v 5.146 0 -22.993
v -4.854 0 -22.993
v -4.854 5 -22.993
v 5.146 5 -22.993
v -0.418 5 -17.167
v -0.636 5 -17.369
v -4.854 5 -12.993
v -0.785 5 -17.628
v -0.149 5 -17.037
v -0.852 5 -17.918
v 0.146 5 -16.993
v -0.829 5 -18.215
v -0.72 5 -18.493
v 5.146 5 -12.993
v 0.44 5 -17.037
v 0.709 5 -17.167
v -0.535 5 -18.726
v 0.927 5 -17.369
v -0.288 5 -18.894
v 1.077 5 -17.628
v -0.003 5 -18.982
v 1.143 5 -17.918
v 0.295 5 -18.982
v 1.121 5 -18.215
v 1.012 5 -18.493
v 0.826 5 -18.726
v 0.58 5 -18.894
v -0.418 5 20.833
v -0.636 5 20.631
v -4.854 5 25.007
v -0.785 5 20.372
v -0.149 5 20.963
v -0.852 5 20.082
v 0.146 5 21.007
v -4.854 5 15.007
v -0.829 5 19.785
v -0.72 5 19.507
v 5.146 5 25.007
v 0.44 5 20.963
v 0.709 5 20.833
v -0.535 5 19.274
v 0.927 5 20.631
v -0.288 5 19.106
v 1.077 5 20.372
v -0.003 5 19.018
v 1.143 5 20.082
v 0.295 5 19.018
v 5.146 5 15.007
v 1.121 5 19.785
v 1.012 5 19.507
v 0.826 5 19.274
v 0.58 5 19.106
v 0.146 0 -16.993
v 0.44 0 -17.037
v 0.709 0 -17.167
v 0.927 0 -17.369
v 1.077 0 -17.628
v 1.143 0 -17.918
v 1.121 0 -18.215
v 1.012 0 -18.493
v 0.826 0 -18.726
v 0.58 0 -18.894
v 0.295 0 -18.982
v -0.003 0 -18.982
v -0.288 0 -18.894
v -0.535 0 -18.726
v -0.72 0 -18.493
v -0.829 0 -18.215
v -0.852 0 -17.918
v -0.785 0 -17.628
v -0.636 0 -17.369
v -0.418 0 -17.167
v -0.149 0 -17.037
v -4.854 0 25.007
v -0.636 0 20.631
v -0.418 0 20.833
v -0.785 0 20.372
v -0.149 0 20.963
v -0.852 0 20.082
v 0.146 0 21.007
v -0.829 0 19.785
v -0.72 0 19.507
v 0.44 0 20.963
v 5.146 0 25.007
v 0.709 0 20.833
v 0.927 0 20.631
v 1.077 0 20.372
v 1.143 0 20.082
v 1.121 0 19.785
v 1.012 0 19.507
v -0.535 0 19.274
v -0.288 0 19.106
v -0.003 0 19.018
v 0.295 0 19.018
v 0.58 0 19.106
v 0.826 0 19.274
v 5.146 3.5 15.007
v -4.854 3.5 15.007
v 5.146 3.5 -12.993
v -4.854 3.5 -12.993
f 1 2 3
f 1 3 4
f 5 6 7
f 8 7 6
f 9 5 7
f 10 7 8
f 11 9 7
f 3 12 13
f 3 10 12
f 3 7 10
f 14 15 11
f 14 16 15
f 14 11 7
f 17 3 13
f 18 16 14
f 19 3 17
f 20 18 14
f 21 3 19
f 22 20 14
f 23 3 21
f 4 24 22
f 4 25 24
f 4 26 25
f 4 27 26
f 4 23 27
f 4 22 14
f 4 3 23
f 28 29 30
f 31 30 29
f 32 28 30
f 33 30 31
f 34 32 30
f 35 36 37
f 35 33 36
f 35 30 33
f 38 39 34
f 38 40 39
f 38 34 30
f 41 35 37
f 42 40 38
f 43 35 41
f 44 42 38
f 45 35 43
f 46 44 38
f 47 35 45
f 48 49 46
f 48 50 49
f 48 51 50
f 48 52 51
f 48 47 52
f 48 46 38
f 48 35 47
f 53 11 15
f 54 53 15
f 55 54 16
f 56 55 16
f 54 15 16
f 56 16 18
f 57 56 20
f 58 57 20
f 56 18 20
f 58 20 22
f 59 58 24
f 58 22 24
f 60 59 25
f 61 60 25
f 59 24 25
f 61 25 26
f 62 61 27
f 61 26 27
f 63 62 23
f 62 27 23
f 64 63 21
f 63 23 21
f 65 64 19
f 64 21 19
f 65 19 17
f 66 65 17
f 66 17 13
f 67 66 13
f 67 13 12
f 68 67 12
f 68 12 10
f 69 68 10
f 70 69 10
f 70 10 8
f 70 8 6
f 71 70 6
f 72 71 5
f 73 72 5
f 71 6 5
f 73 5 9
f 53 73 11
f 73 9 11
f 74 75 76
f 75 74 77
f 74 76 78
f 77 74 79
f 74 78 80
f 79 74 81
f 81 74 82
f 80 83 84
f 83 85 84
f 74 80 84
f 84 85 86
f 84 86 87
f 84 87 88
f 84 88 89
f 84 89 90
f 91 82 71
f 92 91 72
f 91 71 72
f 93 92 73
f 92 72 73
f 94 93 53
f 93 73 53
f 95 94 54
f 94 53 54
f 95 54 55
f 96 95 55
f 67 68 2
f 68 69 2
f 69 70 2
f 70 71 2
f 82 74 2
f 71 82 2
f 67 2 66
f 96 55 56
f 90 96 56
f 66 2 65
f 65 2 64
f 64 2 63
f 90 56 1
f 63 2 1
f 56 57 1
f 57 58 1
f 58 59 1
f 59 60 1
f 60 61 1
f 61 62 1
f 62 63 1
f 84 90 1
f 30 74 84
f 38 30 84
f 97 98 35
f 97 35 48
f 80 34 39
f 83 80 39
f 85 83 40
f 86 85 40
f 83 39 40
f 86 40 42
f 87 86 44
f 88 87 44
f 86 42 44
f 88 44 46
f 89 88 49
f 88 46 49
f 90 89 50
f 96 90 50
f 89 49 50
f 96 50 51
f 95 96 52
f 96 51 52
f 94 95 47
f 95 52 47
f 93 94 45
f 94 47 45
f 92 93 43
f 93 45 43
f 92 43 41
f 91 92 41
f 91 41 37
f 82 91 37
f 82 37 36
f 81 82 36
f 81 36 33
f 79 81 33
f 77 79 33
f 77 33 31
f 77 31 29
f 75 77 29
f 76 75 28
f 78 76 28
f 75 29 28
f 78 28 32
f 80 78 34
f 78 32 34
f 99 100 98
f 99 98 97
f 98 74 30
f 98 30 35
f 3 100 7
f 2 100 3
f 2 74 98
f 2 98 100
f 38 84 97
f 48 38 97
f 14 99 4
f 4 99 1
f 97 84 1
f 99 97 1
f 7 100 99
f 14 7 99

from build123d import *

# Parameters (mm, degrees)
SKETCH1_W           = 10
SKETCH1_H           = 48
BOSS_EXTRUDE1_DEPTH = 3.5
SKETCH2_W           = 10
SKETCH2_H           = 10
BOSS_EXTRUDE2_DEPTH = 1.5
SKETCH3_R           = 1
CUT_EXTRUDE1_DEPTH  = 5


with BuildPart() as part:
    # Sketch1 → Boss-Extrude1 (new body)
    with BuildSketch(Plane(origin=(0, 0, 0), x_dir=(1, 0, 0), z_dir=(0, 1, 0))):
        with Locations((0.145631068, -1.007103337)):
            Rectangle(SKETCH1_W, SKETCH1_H)
    extrude(amount=BOSS_EXTRUDE1_DEPTH)

    # Sketch2 → Boss-Extrude2 (add)
    with BuildSketch(Plane(origin=(0, 3.5, 0), x_dir=(1, 0, 0), z_dir=(0, 1, 0))):
        with Locations((0.145631068, 17.992896663)):
            Rectangle(SKETCH2_W, SKETCH2_H)
        with Locations((0.145631068, -20.007103337)):
            Rectangle(SKETCH2_W, SKETCH2_H)
    extrude(amount=BOSS_EXTRUDE2_DEPTH)

    # Sketch3 → Cut-Extrude1 (cut)
    with BuildSketch(Plane(origin=(0, 5, 0), x_dir=(1, 0, 0), z_dir=(0, 1, 0))):
        with Locations(Location((0.145631068, 17.992896663, 0), (0, 0, 270))):
            Circle(SKETCH3_R)
        with Locations(Location((0.145631068, -20.007103337, 0), (0, 0, 270))):
            Circle(SKETCH3_R)
    extrude(amount=-CUT_EXTRUDE1_DEPTH, mode=Mode.SUBTRACT)


solid = part.part
